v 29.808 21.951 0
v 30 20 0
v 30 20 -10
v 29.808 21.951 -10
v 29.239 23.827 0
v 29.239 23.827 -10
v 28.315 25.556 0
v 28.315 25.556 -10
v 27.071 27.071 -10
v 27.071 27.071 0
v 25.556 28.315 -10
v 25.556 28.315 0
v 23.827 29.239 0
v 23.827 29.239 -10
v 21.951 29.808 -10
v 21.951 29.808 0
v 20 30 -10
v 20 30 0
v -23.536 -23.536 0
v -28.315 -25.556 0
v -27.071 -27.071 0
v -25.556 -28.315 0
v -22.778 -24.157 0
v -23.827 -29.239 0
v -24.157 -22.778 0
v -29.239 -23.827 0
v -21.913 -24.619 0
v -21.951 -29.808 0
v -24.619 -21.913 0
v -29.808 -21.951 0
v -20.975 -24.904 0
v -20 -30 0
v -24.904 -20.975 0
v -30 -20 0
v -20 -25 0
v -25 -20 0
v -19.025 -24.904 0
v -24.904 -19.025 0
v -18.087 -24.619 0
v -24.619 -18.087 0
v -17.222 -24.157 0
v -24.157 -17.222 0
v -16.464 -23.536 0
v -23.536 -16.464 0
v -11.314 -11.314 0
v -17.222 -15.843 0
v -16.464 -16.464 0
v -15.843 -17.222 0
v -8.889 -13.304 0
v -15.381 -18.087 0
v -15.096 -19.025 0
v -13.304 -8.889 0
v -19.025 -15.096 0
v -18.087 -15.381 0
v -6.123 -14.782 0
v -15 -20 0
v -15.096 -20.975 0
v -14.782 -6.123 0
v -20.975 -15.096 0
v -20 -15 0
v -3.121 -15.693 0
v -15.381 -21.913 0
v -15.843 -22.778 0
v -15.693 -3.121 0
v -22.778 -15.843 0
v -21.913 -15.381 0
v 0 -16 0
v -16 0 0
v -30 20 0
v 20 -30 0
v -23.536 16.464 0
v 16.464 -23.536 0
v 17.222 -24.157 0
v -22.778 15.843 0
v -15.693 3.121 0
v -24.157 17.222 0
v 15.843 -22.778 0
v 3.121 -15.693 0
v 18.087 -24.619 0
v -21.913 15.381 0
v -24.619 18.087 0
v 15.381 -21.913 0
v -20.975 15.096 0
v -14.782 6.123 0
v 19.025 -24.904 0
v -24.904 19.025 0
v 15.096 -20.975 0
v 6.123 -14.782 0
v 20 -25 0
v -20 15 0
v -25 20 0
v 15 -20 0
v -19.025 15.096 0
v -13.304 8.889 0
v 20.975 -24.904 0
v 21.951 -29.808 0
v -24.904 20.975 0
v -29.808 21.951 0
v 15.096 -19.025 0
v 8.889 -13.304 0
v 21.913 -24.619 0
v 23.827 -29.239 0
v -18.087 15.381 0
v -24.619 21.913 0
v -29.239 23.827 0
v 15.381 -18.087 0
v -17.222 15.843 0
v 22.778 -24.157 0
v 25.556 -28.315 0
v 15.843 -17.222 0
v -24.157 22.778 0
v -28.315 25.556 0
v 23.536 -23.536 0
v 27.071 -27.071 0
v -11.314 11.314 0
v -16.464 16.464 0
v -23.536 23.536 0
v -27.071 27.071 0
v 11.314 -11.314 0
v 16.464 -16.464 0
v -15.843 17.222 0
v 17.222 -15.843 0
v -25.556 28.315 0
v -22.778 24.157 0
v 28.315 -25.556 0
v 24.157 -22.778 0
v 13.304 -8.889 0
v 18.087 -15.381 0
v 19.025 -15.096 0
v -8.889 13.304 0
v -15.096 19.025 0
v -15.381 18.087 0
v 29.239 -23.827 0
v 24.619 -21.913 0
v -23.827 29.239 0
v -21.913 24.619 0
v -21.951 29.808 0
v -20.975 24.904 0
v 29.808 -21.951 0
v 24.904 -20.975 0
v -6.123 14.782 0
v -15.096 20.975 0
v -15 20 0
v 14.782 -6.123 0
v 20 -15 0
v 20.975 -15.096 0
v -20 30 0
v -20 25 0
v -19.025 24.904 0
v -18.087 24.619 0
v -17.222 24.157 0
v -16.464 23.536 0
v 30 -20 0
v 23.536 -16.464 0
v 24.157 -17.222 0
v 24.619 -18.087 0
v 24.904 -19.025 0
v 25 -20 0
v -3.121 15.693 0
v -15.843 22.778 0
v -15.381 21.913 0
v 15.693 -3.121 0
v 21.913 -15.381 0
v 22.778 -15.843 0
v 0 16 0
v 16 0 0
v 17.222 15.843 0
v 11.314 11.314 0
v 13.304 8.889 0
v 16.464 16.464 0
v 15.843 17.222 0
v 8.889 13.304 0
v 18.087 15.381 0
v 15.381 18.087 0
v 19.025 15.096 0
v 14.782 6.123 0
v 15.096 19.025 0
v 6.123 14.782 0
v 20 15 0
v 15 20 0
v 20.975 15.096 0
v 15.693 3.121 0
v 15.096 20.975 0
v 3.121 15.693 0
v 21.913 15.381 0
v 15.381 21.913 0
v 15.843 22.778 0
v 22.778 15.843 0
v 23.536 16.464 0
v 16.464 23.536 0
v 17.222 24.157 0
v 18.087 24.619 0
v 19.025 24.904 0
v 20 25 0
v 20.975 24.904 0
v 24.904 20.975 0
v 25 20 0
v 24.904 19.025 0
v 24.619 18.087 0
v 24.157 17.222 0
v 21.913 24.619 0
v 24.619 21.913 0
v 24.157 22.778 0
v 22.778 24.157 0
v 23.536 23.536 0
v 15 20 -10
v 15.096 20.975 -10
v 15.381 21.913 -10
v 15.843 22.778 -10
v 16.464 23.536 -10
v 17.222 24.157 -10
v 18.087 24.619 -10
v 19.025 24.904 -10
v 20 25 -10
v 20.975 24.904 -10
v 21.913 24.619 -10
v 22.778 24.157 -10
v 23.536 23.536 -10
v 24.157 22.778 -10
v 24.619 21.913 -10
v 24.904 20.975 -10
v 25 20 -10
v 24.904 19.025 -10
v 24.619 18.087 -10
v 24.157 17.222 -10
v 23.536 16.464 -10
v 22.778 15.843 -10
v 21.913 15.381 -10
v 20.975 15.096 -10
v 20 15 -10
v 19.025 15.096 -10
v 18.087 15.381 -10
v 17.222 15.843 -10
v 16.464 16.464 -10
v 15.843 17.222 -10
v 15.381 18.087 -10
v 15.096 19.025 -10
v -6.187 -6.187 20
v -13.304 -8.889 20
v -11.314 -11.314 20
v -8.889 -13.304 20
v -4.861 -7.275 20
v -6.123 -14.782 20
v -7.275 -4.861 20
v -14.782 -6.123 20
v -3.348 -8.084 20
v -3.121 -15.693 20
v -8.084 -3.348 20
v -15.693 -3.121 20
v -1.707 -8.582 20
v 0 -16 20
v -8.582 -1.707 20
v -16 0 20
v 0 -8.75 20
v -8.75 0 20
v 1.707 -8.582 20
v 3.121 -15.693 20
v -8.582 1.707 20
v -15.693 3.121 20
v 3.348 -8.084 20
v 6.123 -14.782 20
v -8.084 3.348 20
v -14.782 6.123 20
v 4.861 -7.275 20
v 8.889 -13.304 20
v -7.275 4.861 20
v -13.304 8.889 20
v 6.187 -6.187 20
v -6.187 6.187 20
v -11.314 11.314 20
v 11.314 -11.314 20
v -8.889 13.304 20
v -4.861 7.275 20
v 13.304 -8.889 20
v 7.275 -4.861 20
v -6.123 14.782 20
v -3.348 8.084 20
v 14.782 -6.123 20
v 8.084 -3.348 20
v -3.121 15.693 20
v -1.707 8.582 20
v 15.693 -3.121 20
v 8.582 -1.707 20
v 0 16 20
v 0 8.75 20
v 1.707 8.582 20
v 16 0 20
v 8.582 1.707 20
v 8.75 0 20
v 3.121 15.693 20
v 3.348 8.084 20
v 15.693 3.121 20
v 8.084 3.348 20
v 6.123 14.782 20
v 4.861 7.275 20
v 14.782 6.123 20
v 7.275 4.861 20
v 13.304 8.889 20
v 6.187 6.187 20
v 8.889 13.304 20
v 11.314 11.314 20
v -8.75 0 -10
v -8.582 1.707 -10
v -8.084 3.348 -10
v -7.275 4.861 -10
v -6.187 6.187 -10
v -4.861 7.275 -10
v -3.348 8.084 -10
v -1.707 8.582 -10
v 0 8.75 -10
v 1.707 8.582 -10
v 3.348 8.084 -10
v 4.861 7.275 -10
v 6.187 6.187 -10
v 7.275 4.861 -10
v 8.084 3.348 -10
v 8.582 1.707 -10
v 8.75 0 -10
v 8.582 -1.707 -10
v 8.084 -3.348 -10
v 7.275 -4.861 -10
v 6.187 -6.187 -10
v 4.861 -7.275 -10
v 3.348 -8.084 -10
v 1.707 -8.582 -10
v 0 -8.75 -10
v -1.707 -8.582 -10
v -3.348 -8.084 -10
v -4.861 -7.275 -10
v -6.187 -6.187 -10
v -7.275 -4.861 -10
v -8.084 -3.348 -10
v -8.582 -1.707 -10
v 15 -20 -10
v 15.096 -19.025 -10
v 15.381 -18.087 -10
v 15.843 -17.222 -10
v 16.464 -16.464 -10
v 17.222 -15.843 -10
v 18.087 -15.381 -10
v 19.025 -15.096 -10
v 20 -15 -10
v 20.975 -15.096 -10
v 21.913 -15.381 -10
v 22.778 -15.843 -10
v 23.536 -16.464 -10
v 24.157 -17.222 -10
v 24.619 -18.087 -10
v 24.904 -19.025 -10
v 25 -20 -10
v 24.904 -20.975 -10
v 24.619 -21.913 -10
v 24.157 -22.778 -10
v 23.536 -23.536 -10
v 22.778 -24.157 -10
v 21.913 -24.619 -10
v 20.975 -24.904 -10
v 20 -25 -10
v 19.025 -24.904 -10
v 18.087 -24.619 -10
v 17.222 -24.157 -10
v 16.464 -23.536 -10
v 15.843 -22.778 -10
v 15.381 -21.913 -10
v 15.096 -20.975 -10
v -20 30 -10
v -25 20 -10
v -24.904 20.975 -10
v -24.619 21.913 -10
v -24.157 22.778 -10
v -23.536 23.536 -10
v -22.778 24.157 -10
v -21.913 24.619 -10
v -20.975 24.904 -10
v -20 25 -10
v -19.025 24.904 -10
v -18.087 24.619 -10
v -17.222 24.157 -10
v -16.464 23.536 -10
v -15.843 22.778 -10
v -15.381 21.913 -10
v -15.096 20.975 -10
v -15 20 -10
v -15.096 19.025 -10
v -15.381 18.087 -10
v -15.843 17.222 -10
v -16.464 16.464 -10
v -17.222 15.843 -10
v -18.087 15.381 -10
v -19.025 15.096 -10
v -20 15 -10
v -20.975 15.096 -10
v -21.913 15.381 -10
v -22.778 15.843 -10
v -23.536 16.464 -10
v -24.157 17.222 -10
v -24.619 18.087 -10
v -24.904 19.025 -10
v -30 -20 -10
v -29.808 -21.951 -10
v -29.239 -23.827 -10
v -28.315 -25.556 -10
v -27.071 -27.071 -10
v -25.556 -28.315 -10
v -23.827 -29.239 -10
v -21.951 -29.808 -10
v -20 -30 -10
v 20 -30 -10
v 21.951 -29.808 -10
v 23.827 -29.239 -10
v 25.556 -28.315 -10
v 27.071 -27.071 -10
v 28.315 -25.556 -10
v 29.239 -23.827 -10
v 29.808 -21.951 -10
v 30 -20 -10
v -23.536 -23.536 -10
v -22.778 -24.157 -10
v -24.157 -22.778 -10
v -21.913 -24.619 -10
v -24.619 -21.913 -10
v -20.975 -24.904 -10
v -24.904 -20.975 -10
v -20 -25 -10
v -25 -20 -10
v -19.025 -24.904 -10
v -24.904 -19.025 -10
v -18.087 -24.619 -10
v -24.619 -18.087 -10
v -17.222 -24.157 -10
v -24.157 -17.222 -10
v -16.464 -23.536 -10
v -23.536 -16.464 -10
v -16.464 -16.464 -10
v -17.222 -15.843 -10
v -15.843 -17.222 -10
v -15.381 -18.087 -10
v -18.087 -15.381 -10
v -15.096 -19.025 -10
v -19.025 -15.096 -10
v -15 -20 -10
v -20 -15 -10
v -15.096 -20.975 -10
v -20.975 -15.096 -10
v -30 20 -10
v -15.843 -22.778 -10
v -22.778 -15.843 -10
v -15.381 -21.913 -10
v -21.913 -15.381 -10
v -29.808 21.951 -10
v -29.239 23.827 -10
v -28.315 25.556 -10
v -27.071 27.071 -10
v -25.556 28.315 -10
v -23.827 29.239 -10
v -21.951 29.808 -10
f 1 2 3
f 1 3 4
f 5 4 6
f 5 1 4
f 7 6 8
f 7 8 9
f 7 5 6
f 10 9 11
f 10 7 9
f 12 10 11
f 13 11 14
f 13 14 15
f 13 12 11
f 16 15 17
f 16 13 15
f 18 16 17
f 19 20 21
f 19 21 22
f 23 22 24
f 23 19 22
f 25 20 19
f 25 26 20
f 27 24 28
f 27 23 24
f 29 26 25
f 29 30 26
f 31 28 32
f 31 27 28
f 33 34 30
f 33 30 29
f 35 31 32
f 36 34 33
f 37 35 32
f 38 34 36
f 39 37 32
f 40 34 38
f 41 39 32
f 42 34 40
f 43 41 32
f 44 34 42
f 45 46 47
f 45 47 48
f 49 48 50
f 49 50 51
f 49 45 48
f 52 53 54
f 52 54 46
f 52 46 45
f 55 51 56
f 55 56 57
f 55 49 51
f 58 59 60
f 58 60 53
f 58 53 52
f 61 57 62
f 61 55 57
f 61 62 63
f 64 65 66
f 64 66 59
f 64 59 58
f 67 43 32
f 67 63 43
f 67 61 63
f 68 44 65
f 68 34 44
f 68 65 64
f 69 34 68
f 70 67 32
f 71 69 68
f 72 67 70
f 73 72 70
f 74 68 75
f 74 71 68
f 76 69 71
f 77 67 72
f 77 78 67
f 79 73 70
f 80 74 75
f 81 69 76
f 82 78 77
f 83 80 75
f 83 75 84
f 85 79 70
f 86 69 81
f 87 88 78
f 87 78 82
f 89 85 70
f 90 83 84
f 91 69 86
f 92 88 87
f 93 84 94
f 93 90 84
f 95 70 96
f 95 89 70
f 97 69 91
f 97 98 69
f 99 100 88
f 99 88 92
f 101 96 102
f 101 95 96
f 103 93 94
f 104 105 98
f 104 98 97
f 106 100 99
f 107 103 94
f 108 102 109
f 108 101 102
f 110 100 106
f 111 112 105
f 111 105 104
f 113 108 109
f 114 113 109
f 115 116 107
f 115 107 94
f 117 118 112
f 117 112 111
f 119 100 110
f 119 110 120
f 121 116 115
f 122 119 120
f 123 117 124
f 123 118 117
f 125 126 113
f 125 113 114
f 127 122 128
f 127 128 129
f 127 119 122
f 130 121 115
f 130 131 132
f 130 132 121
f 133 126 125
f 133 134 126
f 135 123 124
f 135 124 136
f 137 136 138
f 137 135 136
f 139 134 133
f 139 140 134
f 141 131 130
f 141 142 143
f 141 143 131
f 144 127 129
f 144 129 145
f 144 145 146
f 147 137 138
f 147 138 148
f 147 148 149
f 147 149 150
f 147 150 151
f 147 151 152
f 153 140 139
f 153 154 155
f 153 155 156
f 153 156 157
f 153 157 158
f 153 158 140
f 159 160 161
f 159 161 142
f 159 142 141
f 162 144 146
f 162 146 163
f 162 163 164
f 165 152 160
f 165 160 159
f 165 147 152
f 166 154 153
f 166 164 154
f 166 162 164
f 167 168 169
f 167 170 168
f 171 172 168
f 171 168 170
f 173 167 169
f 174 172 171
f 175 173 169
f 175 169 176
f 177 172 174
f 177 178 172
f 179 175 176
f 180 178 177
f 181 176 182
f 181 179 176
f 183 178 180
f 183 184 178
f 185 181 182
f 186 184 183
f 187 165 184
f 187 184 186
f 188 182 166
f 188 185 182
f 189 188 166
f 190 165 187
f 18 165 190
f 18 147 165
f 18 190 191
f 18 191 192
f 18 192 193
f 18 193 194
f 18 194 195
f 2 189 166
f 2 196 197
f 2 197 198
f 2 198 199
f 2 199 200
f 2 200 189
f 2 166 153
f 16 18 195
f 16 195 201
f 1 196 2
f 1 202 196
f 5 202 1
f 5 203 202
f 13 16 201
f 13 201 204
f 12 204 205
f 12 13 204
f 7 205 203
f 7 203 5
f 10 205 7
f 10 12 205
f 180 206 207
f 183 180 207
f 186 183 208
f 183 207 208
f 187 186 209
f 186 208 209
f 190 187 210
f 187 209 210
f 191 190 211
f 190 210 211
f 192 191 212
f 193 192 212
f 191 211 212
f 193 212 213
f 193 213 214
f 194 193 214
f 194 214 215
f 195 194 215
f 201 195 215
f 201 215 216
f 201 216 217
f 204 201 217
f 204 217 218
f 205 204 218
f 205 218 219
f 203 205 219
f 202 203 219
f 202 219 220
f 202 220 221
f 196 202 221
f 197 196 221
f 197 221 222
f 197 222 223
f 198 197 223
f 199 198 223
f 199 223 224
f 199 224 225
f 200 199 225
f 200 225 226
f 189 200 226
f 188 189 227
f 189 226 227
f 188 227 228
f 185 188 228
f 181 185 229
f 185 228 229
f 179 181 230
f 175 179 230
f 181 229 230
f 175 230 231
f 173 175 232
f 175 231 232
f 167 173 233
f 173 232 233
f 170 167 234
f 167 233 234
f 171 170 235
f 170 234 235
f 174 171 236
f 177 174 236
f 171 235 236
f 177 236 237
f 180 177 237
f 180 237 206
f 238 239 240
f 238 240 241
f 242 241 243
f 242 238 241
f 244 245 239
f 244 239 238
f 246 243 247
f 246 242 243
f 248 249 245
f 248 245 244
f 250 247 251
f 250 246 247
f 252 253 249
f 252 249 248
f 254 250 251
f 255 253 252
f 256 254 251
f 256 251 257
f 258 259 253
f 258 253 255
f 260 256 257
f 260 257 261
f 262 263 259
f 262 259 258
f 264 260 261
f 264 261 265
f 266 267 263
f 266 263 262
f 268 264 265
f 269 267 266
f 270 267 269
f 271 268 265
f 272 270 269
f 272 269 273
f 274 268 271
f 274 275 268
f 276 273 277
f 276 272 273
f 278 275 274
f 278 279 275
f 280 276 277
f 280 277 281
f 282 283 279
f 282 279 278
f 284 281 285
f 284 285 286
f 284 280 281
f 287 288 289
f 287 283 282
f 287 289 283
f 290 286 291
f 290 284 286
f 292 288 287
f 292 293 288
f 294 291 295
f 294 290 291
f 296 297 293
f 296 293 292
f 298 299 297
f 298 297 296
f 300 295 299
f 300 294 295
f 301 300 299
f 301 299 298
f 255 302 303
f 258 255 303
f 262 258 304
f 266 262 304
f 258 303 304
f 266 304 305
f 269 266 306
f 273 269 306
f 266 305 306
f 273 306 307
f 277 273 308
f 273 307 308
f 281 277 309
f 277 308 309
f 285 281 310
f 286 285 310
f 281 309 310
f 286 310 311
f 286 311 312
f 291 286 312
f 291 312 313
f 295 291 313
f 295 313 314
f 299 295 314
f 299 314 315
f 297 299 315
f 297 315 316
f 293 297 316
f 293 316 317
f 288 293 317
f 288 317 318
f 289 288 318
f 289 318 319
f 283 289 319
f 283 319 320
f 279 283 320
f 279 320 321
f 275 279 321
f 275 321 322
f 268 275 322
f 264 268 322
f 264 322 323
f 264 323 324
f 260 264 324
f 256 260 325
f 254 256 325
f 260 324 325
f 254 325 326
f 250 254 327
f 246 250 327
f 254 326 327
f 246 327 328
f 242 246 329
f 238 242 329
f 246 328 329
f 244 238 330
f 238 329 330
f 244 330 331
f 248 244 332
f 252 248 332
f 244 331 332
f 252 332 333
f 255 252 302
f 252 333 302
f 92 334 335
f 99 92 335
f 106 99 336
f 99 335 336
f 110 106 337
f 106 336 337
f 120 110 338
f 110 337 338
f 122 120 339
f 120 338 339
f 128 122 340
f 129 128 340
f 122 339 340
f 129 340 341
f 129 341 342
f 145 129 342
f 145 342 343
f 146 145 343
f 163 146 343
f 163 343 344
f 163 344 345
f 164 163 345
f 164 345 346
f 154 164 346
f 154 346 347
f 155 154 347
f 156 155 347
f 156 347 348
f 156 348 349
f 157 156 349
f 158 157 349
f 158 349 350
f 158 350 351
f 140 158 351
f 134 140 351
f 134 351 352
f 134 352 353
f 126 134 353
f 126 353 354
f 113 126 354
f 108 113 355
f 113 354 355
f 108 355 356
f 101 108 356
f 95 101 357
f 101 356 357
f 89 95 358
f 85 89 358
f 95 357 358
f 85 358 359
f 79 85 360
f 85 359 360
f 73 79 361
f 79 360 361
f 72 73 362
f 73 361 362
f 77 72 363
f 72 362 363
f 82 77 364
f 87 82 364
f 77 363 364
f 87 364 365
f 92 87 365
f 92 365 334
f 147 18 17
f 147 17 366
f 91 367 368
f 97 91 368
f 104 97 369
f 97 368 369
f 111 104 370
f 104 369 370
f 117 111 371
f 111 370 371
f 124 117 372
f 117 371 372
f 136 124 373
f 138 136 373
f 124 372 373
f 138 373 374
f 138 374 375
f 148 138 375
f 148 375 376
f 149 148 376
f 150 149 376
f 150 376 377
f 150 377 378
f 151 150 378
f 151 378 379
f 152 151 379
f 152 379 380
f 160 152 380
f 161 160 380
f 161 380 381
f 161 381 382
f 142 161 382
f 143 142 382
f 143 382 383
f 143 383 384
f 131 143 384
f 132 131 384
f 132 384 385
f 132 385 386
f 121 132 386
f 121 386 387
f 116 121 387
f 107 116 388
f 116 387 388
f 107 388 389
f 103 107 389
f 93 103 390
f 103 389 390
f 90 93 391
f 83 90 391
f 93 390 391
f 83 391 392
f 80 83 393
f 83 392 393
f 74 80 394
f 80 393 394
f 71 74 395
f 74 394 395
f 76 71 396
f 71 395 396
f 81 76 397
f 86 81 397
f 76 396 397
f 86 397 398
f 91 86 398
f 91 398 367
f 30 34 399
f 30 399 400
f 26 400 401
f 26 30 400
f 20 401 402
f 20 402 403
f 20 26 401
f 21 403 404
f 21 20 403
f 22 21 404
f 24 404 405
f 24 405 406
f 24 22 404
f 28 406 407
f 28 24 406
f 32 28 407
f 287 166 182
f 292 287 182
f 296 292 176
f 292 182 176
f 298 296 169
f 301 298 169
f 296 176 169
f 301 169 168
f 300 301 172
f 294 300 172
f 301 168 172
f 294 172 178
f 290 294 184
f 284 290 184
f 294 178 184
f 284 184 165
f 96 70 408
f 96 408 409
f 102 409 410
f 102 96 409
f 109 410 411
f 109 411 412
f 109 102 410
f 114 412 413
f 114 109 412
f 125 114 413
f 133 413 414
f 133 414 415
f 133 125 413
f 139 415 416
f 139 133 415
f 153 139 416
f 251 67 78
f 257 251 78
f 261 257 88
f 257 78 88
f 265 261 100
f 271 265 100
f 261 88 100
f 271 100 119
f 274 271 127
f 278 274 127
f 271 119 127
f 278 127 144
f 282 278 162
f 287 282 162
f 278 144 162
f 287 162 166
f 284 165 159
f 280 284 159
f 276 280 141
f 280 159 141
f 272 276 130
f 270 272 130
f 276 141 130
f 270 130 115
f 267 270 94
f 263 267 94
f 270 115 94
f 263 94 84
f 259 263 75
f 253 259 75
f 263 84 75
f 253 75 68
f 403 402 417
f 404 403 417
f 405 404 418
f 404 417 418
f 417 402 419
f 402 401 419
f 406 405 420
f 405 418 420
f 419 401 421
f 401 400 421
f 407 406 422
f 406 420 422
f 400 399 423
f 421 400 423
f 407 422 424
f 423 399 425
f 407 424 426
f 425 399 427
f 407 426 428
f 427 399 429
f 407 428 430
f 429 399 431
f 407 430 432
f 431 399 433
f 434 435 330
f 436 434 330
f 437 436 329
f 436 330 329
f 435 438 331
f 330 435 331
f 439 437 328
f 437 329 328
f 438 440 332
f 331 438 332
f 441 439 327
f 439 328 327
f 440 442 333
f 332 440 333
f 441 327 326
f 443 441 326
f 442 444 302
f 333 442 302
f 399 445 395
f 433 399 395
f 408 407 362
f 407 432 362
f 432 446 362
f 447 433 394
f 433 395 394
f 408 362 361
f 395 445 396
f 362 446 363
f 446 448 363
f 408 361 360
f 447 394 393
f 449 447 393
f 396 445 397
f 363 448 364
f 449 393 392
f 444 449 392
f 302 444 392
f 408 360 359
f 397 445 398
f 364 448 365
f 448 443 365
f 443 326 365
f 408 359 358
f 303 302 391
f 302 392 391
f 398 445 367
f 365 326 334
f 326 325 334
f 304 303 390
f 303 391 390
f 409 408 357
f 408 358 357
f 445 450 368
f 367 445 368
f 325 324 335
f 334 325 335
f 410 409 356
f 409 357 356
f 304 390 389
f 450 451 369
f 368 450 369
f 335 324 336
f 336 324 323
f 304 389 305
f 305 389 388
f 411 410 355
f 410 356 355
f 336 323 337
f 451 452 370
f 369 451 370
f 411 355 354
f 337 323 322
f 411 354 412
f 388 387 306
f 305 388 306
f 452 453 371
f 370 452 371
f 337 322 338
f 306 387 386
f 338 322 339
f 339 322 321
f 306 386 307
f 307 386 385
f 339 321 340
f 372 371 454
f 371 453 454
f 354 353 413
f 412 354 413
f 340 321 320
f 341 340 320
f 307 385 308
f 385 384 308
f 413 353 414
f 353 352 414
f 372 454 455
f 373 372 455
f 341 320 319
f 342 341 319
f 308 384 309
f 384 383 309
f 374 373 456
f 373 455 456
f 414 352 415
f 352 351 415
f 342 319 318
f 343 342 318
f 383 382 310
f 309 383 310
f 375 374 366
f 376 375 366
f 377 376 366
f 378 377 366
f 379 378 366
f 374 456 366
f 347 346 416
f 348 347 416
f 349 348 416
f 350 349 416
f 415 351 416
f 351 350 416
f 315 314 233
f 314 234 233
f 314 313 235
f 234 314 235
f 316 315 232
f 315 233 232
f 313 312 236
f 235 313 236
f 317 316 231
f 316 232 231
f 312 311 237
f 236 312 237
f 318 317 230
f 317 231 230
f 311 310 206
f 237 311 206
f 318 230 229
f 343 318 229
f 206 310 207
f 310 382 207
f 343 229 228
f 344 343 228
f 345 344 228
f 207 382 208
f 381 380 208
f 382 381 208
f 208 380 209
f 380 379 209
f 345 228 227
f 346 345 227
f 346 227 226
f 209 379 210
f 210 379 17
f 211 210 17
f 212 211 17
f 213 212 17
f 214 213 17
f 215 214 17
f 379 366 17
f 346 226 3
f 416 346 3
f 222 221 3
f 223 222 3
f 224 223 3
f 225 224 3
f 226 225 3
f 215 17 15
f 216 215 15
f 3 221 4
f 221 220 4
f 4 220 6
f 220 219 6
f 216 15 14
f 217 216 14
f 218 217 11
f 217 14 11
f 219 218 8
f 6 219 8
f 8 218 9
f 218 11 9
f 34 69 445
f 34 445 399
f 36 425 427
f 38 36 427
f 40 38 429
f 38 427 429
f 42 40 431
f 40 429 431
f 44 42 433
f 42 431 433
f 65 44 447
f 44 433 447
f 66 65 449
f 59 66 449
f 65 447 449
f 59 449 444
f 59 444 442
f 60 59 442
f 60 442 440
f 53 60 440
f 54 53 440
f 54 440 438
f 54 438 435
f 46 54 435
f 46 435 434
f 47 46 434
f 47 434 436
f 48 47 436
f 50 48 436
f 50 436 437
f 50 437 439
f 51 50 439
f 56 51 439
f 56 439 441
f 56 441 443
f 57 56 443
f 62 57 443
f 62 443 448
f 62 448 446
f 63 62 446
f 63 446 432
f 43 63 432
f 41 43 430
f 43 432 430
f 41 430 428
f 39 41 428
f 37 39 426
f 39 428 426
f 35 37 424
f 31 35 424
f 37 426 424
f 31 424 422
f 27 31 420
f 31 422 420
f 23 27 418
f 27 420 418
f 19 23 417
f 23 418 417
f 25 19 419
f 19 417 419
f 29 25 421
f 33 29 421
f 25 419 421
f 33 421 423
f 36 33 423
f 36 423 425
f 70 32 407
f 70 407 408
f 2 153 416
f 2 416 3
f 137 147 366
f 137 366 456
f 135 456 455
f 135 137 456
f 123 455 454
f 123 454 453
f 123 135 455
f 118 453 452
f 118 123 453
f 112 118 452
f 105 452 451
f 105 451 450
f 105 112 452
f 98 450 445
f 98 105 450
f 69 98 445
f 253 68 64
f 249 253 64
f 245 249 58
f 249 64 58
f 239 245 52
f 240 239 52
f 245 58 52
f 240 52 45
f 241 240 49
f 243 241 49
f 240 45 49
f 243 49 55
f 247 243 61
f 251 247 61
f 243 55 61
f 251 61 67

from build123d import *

# Parameters (mm, degrees)
F0_R     = 5
F1_DEPTH = 10
F2_D     = 10
F3_D     = 10
F4_D     = 10
F5_D     = 10
F6_DEPTH = 20
F8_D     = 17.5


with BuildPart() as f1:
    # F0 (on Top) → F1 (new body)
    with BuildSketch(Plane.XY):
        with BuildLine():
            Line((0, 30), (-20, 30))
            ThreePointArc((-20, 30), (-27.0710678119, 27.0710678119), (-30, 20))
            Line((-30, 20), (-30, 0))
            Line((-30, 0), (-16, 0))
            ThreePointArc((-16, 0), (-11.313708499, 11.313708499), (0, 16))
            Line((0, 16), (0, 30))
        make_face()
        with Locations((-20, 20)):
            Circle(F0_R, mode=Mode.SUBTRACT)
        with BuildLine():
            Line((20, 30), (0, 30))
            Line((0, 30), (0, 16))
            ThreePointArc((0, 16), (11.313708499, 11.313708499), (16, 0))
            Line((16, 0), (30, 0))
            Line((30, 0), (30, 20))
            ThreePointArc((30, 20), (27.0710678119, 27.0710678119), (20, 30))
        make_face()
        with Locations((20, 20)):
            Circle(F0_R, mode=Mode.SUBTRACT)
        with BuildLine():
            Line((-16, 0), (-30, 0))
            Line((-30, 0), (-30, -20))
            ThreePointArc((-30, -20), (-27.0710678119, -27.0710678119), (-20, -30))
            Line((-20, -30), (0, -30))
            Line((0, -30), (0, -16))
            ThreePointArc((0, -16), (-11.313708499, -11.313708499), (-16, 0))
        make_face()
        with Locations((-20, -20)):
            Circle(F0_R, mode=Mode.SUBTRACT)
        with BuildLine():
            Line((30, 0), (16, 0))
            ThreePointArc((16, 0), (11.313708499, -11.313708499), (0, -16))
            Line((0, -16), (0, -30))
            Line((0, -30), (20, -30))
            ThreePointArc((20, -30), (27.0710678119, -27.0710678119), (30, -20))
            Line((30, -20), (30, 0))
        make_face()
        with Locations((20, -20)):
            Circle(F0_R, mode=Mode.SUBTRACT)
        with BuildLine():
            Line((0, 0), (0, 16))
            ThreePointArc((0, 16), (-11.313708499, 11.313708499), (-16, 0))
            Line((-16, 0), (0, 0))
        make_face()
        with BuildLine():
            ThreePointArc((16, 0), (11.313708499, 11.313708499), (0, 16))
            Line((0, 16), (0, 0))
            Line((0, 0), (16, 0))
        make_face()
        with BuildLine():
            ThreePointArc((0, -16), (11.313708499, -11.313708499), (16, 0))
            Line((16, 0), (0, 0))
            Line((0, 0), (0, -16))
        make_face()
        with Locations((-20, 20)):
            Circle(F0_R)
        with Locations((20, 20)):
            Circle(F0_R)
        with BuildLine():
            Line((0, 0), (-16, 0))
            ThreePointArc((-16, 0), (-11.313708499, -11.313708499), (0, -16))
            Line((0, -16), (0, 0))
        make_face()
        with Locations((20, -20)):
            Circle(F0_R)
        with Locations((-20, -20)):
            Circle(F0_R)
    extrude(amount=-F1_DEPTH)

    # F2 (through all)
    with Locations(Plane.XY):
        with Locations((-20, 20)):
            Hole(F2_D / 2)

    # F3 (through all)
    with Locations(Plane.XY):
        with Locations((20, 20)):
            Hole(F3_D / 2)

    # F4 (through all)
    with Locations(Plane.XY):
        with Locations((20, -20)):
            Hole(F4_D / 2)

    # F5 (through all)
    with Locations(Plane.XY):
        with Locations((-20, -20)):
            Hole(F5_D / 2)

    # F0 (on Top) → F6 (join)
    with BuildSketch(Plane.XY):
        with BuildLine():
            Line((0, 0), (0, 16))
            ThreePointArc((0, 16), (-11.313708499, 11.313708499), (-16, 0))
            Line((-16, 0), (0, 0))
        make_face()
        with BuildLine():
            ThreePointArc((16, 0), (11.313708499, 11.313708499), (0, 16))
            Line((0, 16), (0, 0))
            Line((0, 0), (16, 0))
        make_face()
        with BuildLine():
            ThreePointArc((0, -16), (11.313708499, -11.313708499), (16, 0))
            Line((16, 0), (0, 0))
            Line((0, 0), (0, -16))
        make_face()
        with BuildLine():
            Line((0, 0), (-16, 0))
            ThreePointArc((-16, 0), (-11.313708499, -11.313708499), (0, -16))
            Line((0, -16), (0, 0))
        make_face()
    extrude(amount=F6_DEPTH)

    # F8 (through all)
    with Locations(Plane.XY.offset(20)):
        with Locations((0, 0)):
            Hole(F8_D / 2)


solid = f1.part
